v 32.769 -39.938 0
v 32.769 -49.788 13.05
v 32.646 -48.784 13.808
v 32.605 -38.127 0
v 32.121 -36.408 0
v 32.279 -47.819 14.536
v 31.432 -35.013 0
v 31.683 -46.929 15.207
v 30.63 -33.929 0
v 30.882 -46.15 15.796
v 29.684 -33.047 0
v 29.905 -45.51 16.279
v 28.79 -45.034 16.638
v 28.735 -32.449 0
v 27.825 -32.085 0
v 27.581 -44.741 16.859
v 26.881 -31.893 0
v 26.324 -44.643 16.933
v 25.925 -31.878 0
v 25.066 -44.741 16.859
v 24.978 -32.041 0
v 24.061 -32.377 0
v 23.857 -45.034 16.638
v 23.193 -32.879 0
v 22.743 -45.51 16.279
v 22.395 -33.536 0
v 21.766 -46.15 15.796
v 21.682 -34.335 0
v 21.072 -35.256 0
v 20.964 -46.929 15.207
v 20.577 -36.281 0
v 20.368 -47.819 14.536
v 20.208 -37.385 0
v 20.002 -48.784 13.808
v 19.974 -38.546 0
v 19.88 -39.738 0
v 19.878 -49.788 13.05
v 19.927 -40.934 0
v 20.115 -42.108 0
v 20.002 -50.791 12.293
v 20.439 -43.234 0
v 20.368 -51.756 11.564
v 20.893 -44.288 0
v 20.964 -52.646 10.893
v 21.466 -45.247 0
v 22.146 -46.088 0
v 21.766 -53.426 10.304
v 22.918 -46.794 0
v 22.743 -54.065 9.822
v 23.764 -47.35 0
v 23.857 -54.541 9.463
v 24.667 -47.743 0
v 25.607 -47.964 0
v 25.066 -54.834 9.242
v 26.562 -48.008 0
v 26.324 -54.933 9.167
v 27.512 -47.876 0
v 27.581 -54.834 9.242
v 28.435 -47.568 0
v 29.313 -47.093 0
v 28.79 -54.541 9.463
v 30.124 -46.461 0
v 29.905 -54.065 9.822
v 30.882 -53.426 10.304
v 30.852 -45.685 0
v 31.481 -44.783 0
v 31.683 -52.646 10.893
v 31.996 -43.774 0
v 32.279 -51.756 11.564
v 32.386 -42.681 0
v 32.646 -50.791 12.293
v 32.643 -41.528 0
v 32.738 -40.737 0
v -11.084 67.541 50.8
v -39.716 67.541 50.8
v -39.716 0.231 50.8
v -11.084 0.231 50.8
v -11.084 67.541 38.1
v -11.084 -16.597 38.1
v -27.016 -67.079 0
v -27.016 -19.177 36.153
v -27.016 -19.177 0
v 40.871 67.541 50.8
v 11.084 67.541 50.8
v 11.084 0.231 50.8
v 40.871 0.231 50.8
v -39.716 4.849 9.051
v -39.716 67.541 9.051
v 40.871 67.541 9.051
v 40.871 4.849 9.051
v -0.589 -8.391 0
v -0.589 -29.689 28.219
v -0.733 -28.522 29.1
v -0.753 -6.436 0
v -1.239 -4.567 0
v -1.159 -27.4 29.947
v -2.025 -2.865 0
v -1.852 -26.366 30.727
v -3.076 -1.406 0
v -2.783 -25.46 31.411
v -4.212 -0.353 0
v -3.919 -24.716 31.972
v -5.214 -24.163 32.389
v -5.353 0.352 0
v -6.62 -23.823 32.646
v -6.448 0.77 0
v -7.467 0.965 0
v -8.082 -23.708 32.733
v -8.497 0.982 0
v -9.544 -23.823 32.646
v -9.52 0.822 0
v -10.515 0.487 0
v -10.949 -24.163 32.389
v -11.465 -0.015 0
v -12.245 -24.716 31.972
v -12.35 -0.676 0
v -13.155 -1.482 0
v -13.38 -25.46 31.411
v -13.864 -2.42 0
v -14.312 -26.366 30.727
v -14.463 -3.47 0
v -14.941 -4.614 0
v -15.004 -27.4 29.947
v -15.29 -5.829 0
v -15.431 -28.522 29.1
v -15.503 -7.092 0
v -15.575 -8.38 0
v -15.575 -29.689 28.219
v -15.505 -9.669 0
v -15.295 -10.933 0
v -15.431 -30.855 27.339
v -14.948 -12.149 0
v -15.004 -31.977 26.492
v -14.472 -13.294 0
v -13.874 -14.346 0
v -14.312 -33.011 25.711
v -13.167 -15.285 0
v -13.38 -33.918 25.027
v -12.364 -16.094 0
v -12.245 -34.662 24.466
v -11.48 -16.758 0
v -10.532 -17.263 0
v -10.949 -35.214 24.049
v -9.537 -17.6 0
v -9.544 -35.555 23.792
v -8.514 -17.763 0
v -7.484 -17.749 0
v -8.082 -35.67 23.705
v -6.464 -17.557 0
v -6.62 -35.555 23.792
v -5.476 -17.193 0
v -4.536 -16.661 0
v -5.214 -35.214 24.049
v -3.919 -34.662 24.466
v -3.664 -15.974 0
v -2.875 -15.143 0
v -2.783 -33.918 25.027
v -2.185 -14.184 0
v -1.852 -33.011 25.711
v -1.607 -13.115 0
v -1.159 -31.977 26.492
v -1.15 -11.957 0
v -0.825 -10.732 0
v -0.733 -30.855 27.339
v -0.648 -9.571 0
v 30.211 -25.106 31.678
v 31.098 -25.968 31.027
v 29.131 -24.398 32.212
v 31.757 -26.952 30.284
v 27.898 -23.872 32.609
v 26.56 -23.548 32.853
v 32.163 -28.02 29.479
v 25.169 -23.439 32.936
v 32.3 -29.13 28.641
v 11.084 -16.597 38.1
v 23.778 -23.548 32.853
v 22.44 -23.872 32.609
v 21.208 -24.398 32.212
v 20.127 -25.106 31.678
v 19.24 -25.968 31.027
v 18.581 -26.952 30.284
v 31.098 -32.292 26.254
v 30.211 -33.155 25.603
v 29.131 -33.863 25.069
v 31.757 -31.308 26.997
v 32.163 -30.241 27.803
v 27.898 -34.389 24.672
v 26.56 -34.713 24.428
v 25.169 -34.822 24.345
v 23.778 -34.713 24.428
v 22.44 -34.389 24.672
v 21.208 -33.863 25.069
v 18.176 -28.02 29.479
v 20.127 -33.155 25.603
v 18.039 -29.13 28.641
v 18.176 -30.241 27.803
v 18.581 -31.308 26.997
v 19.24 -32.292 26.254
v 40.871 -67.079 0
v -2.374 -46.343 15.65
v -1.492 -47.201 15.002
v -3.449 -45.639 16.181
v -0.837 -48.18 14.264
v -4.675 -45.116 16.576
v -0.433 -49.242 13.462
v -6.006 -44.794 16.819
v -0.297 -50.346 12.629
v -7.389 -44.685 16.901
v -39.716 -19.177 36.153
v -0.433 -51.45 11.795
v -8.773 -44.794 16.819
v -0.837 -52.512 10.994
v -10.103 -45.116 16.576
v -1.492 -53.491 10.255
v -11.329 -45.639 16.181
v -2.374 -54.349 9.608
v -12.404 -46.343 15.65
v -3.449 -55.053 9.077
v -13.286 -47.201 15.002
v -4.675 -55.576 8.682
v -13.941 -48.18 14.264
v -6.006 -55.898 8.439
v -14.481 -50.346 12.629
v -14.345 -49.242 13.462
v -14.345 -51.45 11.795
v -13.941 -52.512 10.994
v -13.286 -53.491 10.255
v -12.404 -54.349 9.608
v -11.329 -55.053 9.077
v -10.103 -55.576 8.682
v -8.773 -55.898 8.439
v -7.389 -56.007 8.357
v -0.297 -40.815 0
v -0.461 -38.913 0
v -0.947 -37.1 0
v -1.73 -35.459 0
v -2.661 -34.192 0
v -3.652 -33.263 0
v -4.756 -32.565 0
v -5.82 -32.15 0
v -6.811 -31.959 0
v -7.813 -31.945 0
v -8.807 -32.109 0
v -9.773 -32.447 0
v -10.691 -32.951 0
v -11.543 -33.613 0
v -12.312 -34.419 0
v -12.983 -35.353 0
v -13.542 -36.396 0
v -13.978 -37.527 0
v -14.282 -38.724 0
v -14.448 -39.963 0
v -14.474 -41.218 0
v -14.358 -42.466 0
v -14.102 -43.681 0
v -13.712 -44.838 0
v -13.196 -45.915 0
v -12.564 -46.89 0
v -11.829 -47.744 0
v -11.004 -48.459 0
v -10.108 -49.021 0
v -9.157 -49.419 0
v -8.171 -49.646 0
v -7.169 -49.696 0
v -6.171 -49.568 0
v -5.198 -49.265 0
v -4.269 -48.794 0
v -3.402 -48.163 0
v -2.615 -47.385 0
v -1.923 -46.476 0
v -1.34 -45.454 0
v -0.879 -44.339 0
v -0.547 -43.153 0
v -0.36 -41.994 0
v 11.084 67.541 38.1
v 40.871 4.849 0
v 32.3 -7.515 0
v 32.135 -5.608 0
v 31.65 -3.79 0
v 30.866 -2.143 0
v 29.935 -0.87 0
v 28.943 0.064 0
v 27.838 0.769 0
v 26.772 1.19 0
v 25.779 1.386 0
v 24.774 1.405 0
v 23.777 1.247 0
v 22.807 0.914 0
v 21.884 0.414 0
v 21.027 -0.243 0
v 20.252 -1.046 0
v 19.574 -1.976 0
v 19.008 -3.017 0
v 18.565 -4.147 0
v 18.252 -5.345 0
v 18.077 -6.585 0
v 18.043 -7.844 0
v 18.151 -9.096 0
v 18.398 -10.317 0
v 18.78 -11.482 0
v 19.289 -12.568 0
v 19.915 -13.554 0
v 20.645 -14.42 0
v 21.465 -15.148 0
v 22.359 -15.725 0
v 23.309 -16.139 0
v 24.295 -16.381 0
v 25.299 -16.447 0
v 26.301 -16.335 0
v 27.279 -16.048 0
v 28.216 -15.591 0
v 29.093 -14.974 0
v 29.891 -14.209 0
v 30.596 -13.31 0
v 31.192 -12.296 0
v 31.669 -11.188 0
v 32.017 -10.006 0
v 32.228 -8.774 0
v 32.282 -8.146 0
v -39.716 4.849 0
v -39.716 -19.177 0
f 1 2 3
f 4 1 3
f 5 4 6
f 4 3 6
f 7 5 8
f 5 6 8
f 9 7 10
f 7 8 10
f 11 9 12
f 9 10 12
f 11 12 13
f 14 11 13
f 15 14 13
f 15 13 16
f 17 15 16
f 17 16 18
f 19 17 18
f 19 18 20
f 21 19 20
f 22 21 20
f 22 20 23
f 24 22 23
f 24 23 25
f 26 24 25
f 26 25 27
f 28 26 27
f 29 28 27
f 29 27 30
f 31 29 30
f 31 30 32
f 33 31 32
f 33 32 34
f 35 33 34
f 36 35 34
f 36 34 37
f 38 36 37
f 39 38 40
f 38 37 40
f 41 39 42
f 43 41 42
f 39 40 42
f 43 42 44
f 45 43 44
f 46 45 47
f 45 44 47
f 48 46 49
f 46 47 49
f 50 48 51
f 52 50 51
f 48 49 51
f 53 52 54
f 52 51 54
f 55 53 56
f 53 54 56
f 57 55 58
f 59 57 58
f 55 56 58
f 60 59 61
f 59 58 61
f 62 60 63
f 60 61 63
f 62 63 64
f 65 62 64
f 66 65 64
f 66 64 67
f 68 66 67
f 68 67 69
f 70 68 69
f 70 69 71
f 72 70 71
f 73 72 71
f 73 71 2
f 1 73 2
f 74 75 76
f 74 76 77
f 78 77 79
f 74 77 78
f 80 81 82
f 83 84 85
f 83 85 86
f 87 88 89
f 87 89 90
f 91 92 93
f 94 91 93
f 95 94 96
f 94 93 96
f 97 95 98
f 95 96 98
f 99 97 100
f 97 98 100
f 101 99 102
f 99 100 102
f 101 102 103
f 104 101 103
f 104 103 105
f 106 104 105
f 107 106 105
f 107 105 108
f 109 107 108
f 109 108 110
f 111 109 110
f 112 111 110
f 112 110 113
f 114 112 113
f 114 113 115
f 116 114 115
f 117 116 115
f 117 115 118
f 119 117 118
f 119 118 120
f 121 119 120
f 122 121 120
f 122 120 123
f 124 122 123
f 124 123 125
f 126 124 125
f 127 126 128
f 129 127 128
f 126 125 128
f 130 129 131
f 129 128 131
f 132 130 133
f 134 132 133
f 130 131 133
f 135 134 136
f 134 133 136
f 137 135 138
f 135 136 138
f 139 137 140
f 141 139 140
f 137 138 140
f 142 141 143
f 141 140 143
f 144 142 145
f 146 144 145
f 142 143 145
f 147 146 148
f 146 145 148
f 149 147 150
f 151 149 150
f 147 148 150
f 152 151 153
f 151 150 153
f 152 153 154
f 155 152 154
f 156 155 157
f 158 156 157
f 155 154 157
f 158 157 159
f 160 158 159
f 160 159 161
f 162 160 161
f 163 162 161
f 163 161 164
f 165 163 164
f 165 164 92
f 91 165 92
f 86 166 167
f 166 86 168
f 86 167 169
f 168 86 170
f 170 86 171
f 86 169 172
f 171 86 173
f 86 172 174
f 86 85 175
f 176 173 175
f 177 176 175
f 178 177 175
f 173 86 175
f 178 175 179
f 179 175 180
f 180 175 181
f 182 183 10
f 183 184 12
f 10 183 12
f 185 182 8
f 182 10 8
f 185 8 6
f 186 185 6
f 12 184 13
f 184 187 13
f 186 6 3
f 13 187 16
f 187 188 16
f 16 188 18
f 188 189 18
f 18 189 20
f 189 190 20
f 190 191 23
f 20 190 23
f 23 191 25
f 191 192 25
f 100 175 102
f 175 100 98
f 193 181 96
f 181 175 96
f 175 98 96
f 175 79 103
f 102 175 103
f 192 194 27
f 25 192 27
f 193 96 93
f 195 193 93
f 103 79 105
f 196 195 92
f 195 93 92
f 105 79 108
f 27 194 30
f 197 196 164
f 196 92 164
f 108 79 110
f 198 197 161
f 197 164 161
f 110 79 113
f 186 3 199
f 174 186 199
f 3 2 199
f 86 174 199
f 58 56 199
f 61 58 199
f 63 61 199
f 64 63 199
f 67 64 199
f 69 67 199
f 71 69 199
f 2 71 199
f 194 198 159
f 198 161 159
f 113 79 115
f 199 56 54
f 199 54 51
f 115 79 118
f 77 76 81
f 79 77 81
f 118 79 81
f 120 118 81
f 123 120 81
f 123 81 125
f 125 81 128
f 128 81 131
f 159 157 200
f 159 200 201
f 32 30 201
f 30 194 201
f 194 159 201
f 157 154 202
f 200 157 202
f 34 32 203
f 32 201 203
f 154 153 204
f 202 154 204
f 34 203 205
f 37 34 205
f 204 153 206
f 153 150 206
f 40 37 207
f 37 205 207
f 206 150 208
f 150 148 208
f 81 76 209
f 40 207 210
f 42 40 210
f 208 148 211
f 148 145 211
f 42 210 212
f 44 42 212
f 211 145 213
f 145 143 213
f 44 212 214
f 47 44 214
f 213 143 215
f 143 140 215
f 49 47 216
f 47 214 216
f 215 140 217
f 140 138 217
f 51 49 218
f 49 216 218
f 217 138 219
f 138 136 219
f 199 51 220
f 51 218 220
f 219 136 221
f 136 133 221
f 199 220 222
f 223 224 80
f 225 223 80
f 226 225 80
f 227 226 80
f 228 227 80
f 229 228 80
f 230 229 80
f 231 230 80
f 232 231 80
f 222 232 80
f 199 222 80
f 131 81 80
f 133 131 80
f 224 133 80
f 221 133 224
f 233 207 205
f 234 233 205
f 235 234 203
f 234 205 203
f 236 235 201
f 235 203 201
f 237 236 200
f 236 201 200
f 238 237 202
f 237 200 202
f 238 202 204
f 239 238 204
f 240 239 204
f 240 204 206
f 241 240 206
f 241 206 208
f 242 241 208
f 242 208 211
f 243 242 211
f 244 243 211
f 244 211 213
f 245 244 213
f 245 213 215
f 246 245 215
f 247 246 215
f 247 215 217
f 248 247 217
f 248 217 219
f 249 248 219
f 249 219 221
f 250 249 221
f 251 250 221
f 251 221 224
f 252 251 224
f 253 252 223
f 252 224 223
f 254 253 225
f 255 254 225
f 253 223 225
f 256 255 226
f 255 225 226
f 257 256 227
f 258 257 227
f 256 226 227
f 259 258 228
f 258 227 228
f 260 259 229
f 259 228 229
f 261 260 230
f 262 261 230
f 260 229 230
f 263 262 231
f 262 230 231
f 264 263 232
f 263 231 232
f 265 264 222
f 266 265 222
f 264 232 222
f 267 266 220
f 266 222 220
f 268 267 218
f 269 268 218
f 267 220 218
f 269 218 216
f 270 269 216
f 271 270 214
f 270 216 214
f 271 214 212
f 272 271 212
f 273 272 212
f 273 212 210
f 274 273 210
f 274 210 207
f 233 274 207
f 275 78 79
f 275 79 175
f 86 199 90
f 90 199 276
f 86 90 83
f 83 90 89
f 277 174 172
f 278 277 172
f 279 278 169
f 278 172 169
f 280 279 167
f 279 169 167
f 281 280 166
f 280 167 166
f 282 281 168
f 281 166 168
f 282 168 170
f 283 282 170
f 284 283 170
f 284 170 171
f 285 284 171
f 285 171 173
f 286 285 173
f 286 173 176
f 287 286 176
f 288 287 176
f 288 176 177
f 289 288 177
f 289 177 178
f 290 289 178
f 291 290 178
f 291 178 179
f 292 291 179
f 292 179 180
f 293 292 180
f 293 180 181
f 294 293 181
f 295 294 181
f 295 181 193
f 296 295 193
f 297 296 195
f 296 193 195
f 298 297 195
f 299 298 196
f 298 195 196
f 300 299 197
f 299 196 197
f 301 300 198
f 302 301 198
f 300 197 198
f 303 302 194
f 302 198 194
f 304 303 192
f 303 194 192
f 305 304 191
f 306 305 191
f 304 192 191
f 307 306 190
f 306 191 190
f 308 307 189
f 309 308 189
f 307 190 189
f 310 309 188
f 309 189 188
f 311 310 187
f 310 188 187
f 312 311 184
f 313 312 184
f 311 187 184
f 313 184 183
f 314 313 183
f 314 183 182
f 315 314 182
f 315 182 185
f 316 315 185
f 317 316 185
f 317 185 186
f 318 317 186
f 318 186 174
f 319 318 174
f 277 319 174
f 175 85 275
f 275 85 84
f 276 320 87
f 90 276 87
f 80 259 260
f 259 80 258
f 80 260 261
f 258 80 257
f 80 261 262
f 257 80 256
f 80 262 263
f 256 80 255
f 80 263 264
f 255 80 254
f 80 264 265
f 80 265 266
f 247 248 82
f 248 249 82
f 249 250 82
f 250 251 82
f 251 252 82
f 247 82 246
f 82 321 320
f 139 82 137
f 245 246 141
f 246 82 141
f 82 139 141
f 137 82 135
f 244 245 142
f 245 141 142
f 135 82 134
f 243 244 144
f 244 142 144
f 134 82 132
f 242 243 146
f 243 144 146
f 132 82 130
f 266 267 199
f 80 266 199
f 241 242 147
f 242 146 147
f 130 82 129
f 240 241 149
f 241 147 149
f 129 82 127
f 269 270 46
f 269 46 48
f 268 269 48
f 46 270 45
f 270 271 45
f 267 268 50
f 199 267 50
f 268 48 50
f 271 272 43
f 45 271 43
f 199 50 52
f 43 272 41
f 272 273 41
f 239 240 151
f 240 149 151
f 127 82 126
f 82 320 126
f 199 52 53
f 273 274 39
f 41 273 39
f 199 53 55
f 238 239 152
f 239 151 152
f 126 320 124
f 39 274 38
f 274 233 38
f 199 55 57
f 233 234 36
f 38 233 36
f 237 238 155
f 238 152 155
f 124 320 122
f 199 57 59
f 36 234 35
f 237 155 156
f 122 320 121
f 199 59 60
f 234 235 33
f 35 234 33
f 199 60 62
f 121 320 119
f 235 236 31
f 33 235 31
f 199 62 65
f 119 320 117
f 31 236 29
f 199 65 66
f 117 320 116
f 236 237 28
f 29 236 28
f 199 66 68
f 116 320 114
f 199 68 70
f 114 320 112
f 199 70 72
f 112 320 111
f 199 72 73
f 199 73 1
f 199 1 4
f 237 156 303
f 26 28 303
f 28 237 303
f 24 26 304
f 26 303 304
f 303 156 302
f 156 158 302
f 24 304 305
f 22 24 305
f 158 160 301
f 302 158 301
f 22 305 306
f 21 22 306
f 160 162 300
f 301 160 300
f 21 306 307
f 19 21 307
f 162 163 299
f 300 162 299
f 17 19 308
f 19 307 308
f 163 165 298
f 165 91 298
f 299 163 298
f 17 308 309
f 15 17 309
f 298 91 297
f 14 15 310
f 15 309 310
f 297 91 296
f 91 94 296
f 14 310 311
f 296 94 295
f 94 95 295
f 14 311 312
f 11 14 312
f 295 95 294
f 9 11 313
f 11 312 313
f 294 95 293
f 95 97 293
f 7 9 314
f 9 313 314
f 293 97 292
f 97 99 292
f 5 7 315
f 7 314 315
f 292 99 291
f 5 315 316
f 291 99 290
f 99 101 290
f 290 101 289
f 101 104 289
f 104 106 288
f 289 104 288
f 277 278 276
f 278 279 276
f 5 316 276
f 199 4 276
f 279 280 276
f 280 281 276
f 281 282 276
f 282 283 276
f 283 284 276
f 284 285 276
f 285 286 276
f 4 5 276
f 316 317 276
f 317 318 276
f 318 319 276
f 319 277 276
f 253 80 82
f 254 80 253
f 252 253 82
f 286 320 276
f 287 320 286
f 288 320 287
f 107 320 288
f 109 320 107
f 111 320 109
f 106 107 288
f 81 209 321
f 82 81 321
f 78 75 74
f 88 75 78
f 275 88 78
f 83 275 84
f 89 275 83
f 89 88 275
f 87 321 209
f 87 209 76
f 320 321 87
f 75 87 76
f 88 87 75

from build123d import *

# Parameters (mm, degrees)
F0_W      = 80.587271601
F0_H      = 134.6200034022
F1_DEPTH  = 50.8
F3_W      = 22.1672728658
F3_H      = 134.6200034022
F4_DEPTH  = 12.7
F5_DEPTH  = 80.588271601
F6_R      = 7.4930236149
F7_DEPTH  = 81.0970184176
F8_R      = 7.092028965
F9_DEPTH  = 81.0970184176
F10_R     = 7.1305147712
F11_DEPTH = 81.0970184176
F12_R     = 6.445813808
F13_DEPTH = 81.0970184176
F15_DEPTH = 12.7
F16_W     = 62.6918235794
F16_H     = 9.051089175
F17_DEPTH = 80.588271601


with BuildPart() as f1:
    # F0 (on Top) → F1 (new body)
    with BuildSketch(Plane.XY):
        with Locations((0.5772728473, 0.2309121192)):
            Rectangle(F0_W, F0_H)
    extrude(amount=F1_DEPTH)

    # F3 (on face) → F4 (cut)
    with BuildSketch(Plane.XY.offset(50.8)):
        with Locations((9.313e-07, 0.2309121192)):
            Rectangle(F3_W, F3_H)
    extrude(amount=-F4_DEPTH, mode=Mode.SUBTRACT)

    # F2 (on face) → F5 (cut, through all)
    with BuildSketch(Plane(origin=(-39.7163629532, 0, 0), x_dir=(0, -1, 0), z_dir=(-1, 0, 0))):
        Polygon((67.079089582, 50.8), (-0.2309121192, 50.8), (67.079089582, 0), align=None)
    extrude(amount=-F5_DEPTH, mode=Mode.SUBTRACT)

    # F6 (on face) → F7 (cut, through all)
    with BuildSketch(Plane(origin=(0, -24.3426037367, 32.2539507662), x_dir=(1, 0, 0), z_dir=(0, -0.6024068962, 0.7981891577))):
        with Locations((-8.0818189308, -6.697748322)):
            Circle(F6_R)
    extrude(amount=-F7_DEPTH, mode=Mode.SUBTRACT)

    # F8 (on face) → F9 (cut, through all)
    with BuildSketch(Plane(origin=(0, -24.3426037367, 32.2539507662), x_dir=(1, 0, 0), z_dir=(0, -0.6024068962, 0.7981891577))):
        with Locations((-7.3890909553, -32.5778611004)):
            Circle(F8_R)
    extrude(amount=-F9_DEPTH, mode=Mode.SUBTRACT)

    # F10 (on face) → F11 (cut, through all)
    with BuildSketch(Plane(origin=(0, -24.3426037367, 32.2539507662), x_dir=(1, 0, 0), z_dir=(0, -0.6024068962, 0.7981891577))):
        with Locations((25.1690894365, -5.9982873499)):
            Circle(F10_R)
    extrude(amount=-F11_DEPTH, mode=Mode.SUBTRACT)

    # F12 (on face) → F13 (cut, through all)
    with BuildSketch(Plane(origin=(0, -24.3426037367, 32.2539507662), x_dir=(1, 0, 0), z_dir=(0, -0.6024068962, 0.7981891577))):
        with Locations((26.3236388564, -31.878400594)):
            Circle(F12_R)
    extrude(amount=-F13_DEPTH, mode=Mode.SUBTRACT)

    # F14 (on face) → F15 (cut)
    with BuildSketch(Plane(origin=(-39.7163629532, 0, 0), x_dir=(0, -1, 0), z_dir=(-1, 0, 0))):
        Polygon((67.079089582, 0), (19.1769771332, 36.1525367835), (19.1769771332, 0), align=None)
    extrude(amount=-F15_DEPTH, mode=Mode.SUBTRACT)

    # F16 (on face) → F17 (cut, through all)
    with BuildSketch(Plane(origin=(-39.7163629532, 0, 0), x_dir=(0, -1, 0), z_dir=(-1, 0, 0))):
        with Locations((-36.1950020306, 4.5255445875)):
            Rectangle(F16_W, F16_H)
    extrude(amount=-F17_DEPTH, mode=Mode.SUBTRACT)


solid = f1.part
